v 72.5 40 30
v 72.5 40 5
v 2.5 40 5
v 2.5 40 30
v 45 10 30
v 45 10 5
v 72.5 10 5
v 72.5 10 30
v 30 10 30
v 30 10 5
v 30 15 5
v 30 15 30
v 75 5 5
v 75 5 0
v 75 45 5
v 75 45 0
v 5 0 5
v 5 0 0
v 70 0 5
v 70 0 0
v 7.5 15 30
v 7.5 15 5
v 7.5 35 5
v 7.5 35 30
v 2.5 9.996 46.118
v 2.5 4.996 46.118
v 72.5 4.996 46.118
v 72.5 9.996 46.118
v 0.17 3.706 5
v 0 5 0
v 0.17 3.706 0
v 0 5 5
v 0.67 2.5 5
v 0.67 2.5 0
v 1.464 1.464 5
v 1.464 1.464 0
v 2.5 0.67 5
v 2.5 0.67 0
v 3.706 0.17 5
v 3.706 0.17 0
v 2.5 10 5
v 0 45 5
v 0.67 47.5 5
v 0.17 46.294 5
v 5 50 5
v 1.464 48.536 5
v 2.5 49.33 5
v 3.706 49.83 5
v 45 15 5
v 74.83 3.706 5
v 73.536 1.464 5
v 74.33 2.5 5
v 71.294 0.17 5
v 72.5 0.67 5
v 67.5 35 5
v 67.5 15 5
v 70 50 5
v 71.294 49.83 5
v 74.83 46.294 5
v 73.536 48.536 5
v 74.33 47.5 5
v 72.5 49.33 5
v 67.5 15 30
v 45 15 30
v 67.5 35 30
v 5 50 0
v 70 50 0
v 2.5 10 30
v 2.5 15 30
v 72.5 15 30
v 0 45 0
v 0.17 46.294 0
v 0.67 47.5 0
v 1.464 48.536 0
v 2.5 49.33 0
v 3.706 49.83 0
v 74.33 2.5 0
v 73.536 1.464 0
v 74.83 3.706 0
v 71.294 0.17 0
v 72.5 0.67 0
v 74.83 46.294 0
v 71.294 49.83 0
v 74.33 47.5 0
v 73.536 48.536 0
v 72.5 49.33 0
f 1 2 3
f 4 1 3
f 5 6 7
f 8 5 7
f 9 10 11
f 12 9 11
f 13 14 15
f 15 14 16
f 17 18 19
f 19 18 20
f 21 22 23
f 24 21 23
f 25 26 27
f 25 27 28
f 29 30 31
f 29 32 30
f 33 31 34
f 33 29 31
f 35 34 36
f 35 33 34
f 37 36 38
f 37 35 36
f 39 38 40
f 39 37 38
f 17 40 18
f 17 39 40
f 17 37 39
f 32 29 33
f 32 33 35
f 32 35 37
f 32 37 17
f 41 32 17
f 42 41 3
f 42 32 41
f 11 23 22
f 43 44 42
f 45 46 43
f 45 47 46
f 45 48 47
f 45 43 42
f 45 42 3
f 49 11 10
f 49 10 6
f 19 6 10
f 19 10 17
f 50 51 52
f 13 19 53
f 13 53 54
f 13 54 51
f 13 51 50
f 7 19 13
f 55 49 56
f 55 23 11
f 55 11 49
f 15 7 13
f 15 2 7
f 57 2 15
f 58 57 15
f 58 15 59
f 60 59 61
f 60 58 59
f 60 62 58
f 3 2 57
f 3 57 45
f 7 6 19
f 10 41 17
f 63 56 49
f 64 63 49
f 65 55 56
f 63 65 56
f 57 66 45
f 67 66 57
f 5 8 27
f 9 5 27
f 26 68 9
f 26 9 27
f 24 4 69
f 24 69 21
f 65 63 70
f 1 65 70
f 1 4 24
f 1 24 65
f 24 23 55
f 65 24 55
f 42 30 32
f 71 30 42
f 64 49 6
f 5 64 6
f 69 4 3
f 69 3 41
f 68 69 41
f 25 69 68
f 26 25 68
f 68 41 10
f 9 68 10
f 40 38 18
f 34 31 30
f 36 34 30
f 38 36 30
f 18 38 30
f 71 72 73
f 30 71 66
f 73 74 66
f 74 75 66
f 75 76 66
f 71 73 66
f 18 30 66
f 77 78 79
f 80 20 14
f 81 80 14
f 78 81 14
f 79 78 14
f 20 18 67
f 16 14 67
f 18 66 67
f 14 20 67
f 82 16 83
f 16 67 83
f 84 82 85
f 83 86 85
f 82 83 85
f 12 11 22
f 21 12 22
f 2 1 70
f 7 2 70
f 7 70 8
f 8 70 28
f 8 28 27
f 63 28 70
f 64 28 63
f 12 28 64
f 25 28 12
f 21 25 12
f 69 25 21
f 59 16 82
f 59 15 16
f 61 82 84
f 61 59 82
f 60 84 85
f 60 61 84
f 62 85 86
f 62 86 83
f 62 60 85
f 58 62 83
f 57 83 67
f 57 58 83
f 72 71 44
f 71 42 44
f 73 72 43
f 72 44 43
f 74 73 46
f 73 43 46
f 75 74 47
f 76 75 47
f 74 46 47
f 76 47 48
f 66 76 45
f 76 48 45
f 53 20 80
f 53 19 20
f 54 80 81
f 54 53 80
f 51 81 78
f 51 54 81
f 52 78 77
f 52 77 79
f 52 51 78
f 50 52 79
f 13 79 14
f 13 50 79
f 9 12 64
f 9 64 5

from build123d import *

# Parameters (mm, degrees)
F0_W     = 75
F0_H     = 50
F1_DEPTH = 5
F2_R     = 5
F4_DEPTH = 25
F6_DEPTH = 70


with BuildPart() as f1:
    # F0 (on Top) → F1 (new body)
    with BuildSketch(Plane.XY):
        with Locations((37.5, 25)):
            Rectangle(F0_W, F0_H)
    extrude(amount=F1_DEPTH)

    # F2
    f2_edges = [f1.edges().sort_by_distance(p)[0] for p in [
        (75, 0, 2.5),
        (0, 0, 2.5),
        (0, 50, 2.5),
        (75, 50, 2.5),
    ]]
    fillet(f2_edges, radius=F2_R)

    # F3 (on face) → F4 (join)
    with BuildSketch(Plane.XY.offset(5)):
        Polygon((2.5, 40), (2.5, 10), (30, 10), (30, 15), (7.5, 15), (7.5, 35), (67.5, 35), (67.5, 15), (45, 15), (45, 10), (72.5, 10), (72.5, 40), align=None)
    extrude(amount=F4_DEPTH)

    # F5 (on face) → F6 (join)
    with BuildSketch(Plane(origin=(2.5, 0, 0), x_dir=(0, -1, 0), z_dir=(-1, 0, 0))):
        Polygon((-15, 30), (-10, 30), (-4.996269, 46.118304), (-9.996269, 46.118304), align=None)
    extrude(amount=-F6_DEPTH)


solid = f1.part
